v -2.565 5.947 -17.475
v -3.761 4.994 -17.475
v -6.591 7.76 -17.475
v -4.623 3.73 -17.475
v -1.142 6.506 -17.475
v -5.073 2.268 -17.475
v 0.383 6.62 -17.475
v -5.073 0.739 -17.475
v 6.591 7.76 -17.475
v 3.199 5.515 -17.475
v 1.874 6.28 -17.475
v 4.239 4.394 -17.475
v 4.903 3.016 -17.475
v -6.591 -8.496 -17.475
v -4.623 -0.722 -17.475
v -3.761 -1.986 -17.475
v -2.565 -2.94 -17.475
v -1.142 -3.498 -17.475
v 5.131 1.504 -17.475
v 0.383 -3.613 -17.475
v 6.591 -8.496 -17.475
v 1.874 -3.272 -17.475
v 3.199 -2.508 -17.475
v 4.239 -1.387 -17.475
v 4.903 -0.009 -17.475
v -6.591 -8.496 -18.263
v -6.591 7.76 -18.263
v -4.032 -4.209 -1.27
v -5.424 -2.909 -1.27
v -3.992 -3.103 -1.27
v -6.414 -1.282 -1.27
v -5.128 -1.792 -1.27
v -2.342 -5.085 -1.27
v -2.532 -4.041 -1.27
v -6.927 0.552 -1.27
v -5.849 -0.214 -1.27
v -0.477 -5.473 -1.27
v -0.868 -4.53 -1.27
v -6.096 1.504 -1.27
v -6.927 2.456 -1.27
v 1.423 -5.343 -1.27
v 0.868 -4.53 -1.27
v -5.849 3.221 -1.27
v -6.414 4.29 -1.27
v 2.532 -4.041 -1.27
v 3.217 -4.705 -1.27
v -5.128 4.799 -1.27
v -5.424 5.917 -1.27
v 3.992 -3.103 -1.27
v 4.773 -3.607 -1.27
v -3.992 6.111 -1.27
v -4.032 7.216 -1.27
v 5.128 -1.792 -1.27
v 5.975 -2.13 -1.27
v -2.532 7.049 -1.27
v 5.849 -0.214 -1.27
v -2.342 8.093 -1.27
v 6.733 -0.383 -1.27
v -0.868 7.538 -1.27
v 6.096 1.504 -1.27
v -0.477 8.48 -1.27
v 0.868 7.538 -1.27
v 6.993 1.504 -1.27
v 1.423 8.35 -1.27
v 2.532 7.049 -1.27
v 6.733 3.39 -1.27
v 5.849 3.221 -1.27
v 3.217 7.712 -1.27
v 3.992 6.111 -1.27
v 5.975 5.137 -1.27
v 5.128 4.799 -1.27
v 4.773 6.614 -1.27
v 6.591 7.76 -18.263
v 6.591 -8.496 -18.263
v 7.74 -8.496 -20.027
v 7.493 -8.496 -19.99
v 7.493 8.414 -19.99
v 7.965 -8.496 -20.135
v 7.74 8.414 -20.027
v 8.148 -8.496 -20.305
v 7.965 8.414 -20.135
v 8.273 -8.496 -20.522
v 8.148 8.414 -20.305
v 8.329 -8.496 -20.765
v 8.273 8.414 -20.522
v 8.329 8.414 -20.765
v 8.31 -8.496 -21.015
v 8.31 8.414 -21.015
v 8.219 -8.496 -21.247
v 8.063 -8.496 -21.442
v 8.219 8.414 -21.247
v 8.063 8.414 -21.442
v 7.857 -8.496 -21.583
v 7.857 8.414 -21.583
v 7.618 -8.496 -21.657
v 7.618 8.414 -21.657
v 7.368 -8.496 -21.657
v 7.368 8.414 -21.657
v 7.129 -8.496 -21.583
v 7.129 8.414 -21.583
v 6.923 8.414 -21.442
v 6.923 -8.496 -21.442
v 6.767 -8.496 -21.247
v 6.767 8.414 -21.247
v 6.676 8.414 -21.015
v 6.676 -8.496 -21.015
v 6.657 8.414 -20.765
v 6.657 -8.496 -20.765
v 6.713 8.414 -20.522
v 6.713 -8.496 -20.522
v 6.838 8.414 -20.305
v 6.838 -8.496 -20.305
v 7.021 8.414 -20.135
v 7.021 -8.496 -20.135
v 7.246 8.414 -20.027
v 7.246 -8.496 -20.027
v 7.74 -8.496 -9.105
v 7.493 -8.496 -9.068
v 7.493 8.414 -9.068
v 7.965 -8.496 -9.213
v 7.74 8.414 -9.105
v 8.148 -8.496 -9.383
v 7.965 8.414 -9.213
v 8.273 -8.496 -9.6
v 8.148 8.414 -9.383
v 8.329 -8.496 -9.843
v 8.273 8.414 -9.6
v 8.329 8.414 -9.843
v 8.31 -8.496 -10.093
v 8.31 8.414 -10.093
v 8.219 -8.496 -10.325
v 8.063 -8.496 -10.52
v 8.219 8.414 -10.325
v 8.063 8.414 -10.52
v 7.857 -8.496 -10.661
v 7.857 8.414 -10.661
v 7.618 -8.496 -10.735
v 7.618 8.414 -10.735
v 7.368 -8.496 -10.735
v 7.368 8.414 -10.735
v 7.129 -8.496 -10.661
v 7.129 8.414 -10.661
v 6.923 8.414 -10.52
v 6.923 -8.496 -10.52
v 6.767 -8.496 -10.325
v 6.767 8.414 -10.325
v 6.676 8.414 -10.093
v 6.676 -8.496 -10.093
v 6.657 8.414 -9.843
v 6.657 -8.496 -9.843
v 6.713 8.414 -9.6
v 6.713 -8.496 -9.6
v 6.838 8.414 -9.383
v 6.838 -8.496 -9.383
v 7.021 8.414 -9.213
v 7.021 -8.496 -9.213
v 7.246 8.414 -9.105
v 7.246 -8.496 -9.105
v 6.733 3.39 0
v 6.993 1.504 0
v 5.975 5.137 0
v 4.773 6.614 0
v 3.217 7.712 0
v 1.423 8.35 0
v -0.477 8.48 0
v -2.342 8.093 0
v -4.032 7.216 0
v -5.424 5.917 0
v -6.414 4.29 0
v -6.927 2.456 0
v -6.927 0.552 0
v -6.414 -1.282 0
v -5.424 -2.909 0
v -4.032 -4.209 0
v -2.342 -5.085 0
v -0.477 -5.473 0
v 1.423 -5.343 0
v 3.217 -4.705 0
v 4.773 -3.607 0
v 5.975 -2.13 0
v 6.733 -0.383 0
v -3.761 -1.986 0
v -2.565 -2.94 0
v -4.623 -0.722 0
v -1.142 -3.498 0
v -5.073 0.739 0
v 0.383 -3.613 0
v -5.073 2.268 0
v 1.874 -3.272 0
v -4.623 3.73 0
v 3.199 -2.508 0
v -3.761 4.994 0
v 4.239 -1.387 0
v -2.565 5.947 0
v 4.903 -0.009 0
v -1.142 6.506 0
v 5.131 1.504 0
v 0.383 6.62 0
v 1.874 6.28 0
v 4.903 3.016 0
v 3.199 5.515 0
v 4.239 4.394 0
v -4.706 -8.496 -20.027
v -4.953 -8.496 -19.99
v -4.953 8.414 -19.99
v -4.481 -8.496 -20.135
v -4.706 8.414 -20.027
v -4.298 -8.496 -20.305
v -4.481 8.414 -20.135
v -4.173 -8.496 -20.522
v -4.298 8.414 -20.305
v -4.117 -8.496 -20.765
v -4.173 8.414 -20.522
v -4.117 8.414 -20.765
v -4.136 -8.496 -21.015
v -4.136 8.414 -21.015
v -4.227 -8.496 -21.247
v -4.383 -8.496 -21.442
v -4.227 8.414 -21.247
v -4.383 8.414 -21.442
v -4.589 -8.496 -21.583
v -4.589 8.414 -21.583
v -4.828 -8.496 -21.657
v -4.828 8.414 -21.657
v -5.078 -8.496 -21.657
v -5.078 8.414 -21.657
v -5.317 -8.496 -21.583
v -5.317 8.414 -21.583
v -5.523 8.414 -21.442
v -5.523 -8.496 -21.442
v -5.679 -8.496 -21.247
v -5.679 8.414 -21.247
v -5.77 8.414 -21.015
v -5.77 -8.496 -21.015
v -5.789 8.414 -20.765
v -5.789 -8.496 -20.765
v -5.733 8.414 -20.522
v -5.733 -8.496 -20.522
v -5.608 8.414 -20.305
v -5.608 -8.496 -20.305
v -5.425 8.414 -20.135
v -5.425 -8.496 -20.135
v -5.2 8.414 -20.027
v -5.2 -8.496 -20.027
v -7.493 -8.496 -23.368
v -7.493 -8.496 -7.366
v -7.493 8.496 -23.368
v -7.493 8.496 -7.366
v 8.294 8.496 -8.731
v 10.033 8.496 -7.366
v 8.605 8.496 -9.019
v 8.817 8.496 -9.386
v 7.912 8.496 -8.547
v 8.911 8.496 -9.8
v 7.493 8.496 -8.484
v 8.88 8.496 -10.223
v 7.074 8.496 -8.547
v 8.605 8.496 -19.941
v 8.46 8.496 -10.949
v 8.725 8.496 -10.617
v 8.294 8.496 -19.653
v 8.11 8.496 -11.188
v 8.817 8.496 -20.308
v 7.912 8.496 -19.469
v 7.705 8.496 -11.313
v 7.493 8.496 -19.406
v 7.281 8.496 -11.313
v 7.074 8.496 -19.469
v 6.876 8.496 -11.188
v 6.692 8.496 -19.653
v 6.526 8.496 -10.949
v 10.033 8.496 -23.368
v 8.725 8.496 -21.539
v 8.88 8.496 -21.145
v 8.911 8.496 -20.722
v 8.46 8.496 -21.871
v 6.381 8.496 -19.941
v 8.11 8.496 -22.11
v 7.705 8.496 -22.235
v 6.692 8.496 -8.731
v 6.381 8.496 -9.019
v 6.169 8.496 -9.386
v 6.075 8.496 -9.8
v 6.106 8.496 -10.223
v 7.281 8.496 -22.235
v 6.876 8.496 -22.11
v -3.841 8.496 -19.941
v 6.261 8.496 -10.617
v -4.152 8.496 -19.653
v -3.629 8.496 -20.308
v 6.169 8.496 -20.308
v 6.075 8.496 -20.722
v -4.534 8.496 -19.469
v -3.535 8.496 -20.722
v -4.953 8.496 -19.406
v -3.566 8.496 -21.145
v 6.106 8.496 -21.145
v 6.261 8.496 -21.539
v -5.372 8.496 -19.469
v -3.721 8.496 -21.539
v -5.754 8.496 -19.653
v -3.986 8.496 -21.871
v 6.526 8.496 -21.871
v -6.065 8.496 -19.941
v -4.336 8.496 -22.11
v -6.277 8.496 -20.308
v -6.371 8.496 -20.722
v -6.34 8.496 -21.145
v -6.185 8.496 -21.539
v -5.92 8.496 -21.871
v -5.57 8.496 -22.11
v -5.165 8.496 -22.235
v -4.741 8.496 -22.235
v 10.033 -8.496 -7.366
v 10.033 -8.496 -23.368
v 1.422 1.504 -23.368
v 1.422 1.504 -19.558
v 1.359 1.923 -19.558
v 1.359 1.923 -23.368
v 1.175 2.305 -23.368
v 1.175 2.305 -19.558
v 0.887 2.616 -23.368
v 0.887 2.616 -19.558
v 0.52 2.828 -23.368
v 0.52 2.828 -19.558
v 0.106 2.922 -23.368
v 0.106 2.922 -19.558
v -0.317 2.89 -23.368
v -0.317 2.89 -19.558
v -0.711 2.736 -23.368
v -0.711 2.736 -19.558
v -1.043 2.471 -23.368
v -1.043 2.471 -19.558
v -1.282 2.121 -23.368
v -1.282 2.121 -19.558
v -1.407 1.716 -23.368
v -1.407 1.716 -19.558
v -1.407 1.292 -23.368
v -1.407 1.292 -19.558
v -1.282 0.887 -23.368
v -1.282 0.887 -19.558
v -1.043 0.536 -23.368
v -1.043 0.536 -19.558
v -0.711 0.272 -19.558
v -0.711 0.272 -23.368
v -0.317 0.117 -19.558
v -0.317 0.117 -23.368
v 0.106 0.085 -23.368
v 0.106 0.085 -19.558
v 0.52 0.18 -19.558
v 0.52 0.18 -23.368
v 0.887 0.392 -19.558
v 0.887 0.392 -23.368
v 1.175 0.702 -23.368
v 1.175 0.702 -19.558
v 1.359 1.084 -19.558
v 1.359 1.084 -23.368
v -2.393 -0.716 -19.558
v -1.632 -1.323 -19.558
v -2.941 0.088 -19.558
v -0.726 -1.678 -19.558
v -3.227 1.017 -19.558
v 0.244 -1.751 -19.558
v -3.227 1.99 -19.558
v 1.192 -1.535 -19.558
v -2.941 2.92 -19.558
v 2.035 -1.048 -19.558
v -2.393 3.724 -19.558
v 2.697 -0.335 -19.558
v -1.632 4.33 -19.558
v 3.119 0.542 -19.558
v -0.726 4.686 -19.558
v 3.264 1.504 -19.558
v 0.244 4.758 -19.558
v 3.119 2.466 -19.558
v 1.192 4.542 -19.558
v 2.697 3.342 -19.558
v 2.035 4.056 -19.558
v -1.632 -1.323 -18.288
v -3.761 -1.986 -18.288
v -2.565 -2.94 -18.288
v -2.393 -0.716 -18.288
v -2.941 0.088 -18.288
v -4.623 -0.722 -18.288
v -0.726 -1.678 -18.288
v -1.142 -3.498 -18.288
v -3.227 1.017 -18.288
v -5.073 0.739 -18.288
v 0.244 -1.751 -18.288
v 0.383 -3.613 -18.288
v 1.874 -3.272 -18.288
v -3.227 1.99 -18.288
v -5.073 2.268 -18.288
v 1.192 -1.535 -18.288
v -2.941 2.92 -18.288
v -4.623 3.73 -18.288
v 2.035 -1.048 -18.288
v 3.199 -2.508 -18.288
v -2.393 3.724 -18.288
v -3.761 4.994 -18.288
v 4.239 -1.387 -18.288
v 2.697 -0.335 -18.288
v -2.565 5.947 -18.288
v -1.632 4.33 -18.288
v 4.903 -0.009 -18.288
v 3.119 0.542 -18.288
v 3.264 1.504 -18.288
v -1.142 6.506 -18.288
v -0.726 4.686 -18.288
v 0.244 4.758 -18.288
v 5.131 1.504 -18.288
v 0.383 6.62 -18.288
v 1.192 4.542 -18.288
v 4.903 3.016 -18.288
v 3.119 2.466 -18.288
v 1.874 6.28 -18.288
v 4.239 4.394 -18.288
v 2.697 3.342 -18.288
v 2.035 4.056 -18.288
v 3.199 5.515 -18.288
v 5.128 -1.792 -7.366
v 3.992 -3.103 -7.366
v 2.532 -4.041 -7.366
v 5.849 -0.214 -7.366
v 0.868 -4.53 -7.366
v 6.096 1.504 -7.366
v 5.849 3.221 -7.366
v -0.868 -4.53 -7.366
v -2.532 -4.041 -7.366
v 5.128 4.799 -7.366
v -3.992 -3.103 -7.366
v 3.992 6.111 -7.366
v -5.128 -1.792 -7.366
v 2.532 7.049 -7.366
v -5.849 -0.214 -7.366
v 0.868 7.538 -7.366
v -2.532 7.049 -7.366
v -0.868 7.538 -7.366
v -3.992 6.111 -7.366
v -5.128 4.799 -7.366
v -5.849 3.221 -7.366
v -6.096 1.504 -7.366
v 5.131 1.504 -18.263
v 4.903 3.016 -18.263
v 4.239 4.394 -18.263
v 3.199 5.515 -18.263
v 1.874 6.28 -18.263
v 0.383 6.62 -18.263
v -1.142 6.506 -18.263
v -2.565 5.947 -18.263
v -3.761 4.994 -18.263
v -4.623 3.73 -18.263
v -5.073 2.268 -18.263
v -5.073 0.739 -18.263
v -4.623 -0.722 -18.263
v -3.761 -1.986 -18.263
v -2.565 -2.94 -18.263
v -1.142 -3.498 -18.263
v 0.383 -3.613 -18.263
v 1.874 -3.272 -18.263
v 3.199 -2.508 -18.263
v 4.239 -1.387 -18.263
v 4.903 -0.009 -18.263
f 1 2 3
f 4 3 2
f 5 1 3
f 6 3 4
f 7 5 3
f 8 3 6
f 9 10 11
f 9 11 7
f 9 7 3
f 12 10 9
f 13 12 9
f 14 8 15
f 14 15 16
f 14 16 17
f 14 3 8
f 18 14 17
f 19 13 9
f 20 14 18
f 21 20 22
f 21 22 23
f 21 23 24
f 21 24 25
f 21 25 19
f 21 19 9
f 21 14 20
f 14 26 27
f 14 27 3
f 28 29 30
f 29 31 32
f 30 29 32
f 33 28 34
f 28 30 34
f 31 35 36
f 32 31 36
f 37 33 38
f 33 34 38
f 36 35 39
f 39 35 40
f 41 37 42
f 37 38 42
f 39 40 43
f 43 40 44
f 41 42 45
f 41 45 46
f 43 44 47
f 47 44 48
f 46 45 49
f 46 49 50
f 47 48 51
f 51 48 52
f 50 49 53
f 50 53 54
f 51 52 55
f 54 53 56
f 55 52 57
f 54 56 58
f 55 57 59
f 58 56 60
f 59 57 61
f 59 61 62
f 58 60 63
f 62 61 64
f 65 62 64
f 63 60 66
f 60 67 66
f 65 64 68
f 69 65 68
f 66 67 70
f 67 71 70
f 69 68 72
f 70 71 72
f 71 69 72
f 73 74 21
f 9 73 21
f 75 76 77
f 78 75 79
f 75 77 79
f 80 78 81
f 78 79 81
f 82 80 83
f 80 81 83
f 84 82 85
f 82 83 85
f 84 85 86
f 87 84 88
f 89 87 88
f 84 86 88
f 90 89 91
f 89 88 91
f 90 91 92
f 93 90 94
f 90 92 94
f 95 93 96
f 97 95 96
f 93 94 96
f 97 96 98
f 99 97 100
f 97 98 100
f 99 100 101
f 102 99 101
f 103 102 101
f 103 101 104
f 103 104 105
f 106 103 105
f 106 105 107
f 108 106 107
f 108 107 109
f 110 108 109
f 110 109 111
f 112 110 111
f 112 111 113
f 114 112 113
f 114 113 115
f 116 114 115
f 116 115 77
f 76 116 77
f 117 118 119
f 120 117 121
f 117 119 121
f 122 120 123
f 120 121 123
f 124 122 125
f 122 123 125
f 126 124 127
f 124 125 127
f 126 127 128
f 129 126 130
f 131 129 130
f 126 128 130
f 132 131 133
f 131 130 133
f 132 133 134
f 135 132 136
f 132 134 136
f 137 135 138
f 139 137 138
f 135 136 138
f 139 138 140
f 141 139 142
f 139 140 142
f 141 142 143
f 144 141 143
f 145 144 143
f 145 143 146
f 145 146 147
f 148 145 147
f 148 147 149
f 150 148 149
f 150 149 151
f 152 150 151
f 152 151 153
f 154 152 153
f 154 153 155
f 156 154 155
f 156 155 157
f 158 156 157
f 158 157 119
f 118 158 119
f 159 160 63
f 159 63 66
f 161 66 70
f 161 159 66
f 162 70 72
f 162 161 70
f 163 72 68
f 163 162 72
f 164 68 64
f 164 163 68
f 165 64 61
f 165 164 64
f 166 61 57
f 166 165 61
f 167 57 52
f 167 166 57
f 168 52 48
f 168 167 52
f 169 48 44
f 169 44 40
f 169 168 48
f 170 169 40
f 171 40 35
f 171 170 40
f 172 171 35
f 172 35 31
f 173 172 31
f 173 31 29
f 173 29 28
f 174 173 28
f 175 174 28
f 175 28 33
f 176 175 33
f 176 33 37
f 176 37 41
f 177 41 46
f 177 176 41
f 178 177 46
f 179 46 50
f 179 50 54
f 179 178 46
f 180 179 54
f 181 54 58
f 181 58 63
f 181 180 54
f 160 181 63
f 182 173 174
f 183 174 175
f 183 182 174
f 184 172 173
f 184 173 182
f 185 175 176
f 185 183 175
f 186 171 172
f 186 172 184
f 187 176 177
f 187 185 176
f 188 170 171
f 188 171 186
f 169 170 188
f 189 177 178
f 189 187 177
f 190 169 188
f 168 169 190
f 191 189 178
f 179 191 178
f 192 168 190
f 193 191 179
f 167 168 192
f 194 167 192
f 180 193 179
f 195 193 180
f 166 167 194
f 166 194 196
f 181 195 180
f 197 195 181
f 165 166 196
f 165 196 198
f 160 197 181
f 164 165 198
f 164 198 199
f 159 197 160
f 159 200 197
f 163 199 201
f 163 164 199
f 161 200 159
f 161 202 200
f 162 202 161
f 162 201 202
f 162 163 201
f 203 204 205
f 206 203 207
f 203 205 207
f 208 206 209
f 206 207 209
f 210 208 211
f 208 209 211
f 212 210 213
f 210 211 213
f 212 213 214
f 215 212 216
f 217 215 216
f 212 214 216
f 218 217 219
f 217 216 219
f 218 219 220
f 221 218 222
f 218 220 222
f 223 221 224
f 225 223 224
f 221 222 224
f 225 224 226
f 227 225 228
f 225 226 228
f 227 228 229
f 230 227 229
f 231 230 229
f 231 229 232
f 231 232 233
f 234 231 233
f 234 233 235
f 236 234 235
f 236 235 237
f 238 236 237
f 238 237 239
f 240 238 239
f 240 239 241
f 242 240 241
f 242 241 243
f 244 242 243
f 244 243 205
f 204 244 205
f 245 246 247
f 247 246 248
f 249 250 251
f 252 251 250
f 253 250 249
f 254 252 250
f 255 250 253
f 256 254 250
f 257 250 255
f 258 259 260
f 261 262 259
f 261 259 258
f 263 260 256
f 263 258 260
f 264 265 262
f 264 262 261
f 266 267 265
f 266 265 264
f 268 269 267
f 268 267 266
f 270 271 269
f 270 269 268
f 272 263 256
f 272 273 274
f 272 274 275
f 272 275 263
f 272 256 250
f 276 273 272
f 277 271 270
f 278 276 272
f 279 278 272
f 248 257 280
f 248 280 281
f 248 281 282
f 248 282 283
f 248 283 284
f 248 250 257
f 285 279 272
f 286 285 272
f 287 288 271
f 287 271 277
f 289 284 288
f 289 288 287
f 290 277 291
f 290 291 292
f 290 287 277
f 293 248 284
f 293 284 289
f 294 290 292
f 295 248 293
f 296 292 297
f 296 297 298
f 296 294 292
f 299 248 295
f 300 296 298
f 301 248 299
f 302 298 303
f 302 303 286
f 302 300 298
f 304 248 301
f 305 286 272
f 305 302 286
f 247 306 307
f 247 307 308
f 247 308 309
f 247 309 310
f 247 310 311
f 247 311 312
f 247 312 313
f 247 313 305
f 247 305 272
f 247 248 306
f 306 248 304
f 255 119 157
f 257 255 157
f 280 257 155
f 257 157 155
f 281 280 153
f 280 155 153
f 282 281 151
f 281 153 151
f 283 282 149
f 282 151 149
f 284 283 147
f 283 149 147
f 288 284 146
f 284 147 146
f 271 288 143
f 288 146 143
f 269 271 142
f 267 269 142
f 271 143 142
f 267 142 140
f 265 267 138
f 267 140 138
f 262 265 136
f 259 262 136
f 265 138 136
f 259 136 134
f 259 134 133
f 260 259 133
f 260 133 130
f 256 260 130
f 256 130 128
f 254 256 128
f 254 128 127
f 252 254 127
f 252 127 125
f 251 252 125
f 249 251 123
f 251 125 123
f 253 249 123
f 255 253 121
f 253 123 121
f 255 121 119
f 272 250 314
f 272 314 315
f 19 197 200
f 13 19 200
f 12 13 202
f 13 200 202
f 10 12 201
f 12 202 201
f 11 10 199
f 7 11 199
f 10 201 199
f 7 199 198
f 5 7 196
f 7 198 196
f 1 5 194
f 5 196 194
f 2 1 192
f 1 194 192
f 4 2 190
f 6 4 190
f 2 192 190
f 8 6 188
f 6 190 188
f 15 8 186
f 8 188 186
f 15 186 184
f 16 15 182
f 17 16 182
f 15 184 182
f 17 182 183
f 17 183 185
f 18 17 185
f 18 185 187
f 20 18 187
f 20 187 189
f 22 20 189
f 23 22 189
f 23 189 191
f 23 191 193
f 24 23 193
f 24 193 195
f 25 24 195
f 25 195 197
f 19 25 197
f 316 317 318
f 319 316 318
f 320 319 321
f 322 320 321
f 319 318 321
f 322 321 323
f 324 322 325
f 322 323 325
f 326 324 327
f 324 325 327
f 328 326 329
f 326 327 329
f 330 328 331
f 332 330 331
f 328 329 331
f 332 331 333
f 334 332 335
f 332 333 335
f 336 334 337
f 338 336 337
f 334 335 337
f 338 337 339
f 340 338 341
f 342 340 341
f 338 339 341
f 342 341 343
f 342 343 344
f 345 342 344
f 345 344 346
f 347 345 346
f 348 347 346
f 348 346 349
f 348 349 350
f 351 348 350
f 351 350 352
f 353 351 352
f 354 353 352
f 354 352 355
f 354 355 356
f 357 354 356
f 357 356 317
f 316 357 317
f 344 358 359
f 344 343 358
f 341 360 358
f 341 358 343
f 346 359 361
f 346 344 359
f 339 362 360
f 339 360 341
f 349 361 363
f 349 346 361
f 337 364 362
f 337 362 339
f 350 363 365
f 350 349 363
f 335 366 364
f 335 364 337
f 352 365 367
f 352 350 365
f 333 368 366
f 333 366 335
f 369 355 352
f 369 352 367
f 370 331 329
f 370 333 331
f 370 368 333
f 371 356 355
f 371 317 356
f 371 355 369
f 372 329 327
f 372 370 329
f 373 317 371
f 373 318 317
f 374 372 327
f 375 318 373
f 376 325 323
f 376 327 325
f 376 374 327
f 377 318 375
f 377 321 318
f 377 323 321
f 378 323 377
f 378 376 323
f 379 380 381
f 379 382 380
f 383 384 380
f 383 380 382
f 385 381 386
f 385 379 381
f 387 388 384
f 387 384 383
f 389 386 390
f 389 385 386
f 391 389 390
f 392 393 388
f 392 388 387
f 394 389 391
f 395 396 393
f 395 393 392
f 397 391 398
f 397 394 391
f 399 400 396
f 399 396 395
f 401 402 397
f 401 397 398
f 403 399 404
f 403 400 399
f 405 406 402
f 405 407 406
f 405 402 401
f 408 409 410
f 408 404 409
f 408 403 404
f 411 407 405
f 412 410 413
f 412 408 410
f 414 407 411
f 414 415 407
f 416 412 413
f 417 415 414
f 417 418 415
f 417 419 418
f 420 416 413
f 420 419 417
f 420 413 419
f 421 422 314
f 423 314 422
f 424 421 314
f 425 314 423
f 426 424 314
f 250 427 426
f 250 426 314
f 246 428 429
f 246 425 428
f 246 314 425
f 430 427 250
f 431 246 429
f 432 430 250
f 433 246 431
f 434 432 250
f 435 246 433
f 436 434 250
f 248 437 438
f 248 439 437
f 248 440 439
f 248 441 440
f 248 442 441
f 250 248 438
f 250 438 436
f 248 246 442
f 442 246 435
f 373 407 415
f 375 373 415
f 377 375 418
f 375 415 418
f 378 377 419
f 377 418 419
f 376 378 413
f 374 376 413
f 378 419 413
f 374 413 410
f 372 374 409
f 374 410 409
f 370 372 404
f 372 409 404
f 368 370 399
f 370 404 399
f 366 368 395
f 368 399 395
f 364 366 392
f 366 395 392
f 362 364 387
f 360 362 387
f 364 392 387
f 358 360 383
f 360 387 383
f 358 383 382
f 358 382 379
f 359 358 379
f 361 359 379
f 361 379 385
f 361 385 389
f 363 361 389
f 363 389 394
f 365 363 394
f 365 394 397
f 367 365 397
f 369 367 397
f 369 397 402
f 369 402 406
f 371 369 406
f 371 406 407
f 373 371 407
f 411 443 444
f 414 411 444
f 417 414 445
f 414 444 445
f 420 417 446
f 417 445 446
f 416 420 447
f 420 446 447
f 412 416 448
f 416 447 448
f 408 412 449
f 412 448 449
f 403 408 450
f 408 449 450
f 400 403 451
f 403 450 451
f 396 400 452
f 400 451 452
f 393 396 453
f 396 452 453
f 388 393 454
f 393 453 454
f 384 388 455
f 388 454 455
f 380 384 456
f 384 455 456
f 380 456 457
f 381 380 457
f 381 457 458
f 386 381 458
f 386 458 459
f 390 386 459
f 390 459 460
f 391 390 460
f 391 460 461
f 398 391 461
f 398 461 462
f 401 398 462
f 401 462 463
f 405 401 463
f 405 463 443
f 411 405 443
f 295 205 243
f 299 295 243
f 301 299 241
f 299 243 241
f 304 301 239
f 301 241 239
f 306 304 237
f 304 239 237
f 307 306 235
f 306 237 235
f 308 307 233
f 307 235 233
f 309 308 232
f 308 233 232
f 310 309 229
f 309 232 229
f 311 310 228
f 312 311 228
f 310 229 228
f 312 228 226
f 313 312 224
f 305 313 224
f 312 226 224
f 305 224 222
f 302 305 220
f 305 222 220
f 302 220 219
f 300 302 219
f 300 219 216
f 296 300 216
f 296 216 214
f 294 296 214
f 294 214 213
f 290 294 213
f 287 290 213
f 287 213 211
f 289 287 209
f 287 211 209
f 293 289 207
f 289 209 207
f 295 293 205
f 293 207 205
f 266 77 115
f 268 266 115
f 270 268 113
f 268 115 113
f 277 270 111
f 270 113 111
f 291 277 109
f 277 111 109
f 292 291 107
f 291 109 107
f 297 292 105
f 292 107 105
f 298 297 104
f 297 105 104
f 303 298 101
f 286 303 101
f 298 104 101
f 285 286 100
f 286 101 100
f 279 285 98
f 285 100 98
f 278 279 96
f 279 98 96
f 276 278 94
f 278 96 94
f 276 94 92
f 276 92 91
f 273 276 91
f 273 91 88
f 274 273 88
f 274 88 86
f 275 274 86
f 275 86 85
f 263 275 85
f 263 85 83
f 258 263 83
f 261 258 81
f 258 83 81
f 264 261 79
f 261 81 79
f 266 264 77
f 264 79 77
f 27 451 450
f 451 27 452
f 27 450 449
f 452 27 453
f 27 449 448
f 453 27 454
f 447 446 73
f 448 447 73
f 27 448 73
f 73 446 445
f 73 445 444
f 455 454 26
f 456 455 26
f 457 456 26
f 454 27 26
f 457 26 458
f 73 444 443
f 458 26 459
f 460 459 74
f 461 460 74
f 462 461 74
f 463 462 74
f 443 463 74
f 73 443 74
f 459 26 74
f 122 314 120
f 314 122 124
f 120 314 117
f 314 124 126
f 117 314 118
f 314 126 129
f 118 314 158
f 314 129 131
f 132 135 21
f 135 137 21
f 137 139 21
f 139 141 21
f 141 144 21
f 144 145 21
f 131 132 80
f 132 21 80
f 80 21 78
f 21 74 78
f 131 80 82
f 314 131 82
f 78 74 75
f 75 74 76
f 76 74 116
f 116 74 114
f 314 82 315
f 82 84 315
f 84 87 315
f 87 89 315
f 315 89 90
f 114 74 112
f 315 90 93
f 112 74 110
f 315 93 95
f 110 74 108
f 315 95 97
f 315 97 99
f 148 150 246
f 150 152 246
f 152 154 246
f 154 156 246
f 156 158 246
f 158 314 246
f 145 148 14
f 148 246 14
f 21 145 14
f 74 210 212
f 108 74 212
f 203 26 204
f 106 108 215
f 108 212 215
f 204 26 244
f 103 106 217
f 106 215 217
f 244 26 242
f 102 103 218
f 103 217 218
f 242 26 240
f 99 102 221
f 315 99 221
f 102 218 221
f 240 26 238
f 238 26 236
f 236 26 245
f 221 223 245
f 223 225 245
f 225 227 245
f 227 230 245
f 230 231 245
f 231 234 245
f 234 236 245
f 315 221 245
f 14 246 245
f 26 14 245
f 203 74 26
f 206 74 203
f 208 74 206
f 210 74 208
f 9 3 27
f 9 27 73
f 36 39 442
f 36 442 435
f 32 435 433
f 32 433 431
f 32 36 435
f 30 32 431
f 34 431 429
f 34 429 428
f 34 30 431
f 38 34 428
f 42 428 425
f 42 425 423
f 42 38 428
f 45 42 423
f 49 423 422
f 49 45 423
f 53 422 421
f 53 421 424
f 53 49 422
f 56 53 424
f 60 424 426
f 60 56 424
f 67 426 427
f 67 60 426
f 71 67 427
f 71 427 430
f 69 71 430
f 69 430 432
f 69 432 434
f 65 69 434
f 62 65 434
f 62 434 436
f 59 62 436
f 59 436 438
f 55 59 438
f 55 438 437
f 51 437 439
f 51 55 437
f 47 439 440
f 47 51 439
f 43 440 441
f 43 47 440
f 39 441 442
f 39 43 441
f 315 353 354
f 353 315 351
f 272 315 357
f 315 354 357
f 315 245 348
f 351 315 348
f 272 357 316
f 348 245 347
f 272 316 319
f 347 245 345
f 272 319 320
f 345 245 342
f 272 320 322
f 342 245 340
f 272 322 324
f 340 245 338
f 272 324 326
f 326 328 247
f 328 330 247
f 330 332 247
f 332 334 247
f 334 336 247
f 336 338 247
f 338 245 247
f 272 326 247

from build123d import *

# Parameters (mm, degrees)
SKETCH1_W           = 14.986
SKETCH1_H           = 16.9926
BOSS_EXTRUDE4_DEPTH = 24.1554
SKETCH10_R          = 1.4224
CUT_EXTRUDE6_DEPTH  = 24.1554
SKETCH11_R          = 3.2639
CUT_EXTRUDE7_DEPTH  = 19.558
SKETCH12_R          = 5.1308
CUT_EXTRUDE8_DEPTH  = 18.288
SKETCH13_W          = 14.986
SKETCH13_H          = 16.9926
SKETCH13_R          = 5.1308
CUT_EXTRUDE9_DEPTH  = 7.366
BOSS_EXTRUDE5_START = 6.096
SKETCH14_R          = 6.096
SKETCH14_R_2        = 5.1308
BOSS_EXTRUDE5_DEPTH = 6.096
BOSS_EXTRUDE6_START = 1.27
SKETCH15_R          = 6.9926
SKETCH15_R_2        = 5.1308
BOSS_EXTRUDE6_DEPTH = 1.27
SKETCH16_W          = 14.986
SKETCH16_H          = 16.9926
CUT_EXTRUDE10_DEPTH = 0.7874
SKETCH18_W          = 16.002
SKETCH18_H          = 16.9926
BOSS_EXTRUDE7_DEPTH = 2.54
SKETCH19_R          = 0.8382
CUT_EXTRUDE11_DEPTH = 20.32
SKETCH24_W          = 13.1826
SKETCH24_H          = 0.7874
CUT_EXTRUDE14_DEPTH = 16.256


with BuildPart() as part:
    # Sketch1 → Boss-Extrude4 (new body)
    with BuildSketch(Plane.XY):
        Rectangle(SKETCH1_W, SKETCH1_H)
    extrude(amount=-BOSS_EXTRUDE4_DEPTH)

    # Sketch10 → Cut-Extrude6 (cut)
    with BuildSketch(Plane.XY):
        with Locations((0, 1.5037)):
            Circle(SKETCH10_R)
    extrude(amount=-CUT_EXTRUDE6_DEPTH, mode=Mode.SUBTRACT)

    # Sketch11 → Cut-Extrude7 (cut)
    with BuildSketch(Plane.XY):
        with Locations((0, 1.5037)):
            Circle(SKETCH11_R)
    extrude(amount=-CUT_EXTRUDE7_DEPTH, mode=Mode.SUBTRACT)

    # Sketch12 → Cut-Extrude8 (cut)
    with BuildSketch(Plane.XY):
        with Locations((0, 1.5037)):
            Circle(SKETCH12_R)
    extrude(amount=-CUT_EXTRUDE8_DEPTH, mode=Mode.SUBTRACT)

    # Sketch13 → Cut-Extrude9 (cut)
    with BuildSketch(Plane.XY):
        Rectangle(SKETCH13_W, SKETCH13_H)
        with Locations((0, 1.5037)):
            Circle(SKETCH13_R, mode=Mode.SUBTRACT)
    extrude(amount=-CUT_EXTRUDE9_DEPTH, mode=Mode.SUBTRACT)

    # Sketch14 → Boss-Extrude5 (add)
    with BuildSketch(Plane.XY.offset(-7.366).offset(BOSS_EXTRUDE5_START)):
        with Locations(Location((0, 1.5037, 0), (0, 0, 180))):
            Circle(SKETCH14_R)
        with Locations((0, 1.5037)):
            Circle(SKETCH14_R_2, mode=Mode.SUBTRACT)
    extrude(amount=-BOSS_EXTRUDE5_DEPTH)

    # Sketch15 → Boss-Extrude6 (add)
    with BuildSketch(Plane.XY.offset(-1.27).offset(BOSS_EXTRUDE6_START)):
        with Locations((0, 1.5037)):
            Circle(SKETCH15_R)
        with Locations((0, 1.5037)):
            Circle(SKETCH15_R_2, mode=Mode.SUBTRACT)
    extrude(amount=-BOSS_EXTRUDE6_DEPTH)

    # Sketch16 → Cut-Extrude10 (cut)
    with BuildSketch(Plane(origin=(0, 0, -24.1554), x_dir=(-1, 0, 0), z_dir=(0, 0, -1))):
        Rectangle(SKETCH16_W, SKETCH16_H)
    extrude(amount=-CUT_EXTRUDE10_DEPTH, mode=Mode.SUBTRACT)

    # Sketch18 → Boss-Extrude7 (add)
    with BuildSketch(Plane(origin=(7.493, 0, 0), x_dir=(0, 0, -1), z_dir=(1, 0, 0))):
        with Locations((15.367, 0)):
            Rectangle(SKETCH18_W, SKETCH18_H)
    extrude(amount=BOSS_EXTRUDE7_DEPTH)

    # Sketch19 → Cut-Extrude11 (cut)
    with BuildSketch(Plane(origin=(0, 8.4963, 0), x_dir=(1, 0, 0), z_dir=(0, 1, 0))):
        with Locations(Location((-4.953, 20.828, 0), (0, 0, 270))):
            Circle(SKETCH19_R)
        with Locations(Location((7.493, 20.828, 0), (0, 0, 270))):
            Circle(SKETCH19_R)
        with Locations(Location((7.493, 9.906, 0), (0, 0, 270))):
            Circle(SKETCH19_R)
    extrude(amount=-CUT_EXTRUDE11_DEPTH, mode=Mode.SUBTRACT)

    # Cut-Extrude13 cone 1 section (through the dimple's axis) → Cut-Extrude13 (revolve, cut)
    with BuildSketch(Plane(origin=(-4.953, 8.4963, -20.828), x_dir=(0, 0, 1), z_dir=(1, 0, 0))):
        Polygon((0, 0), (1.4224, 0), (0, 0.199905283), align=None)
    revolve(axis=Axis((-4.953, 8.4963, -20.828), (0, -1, 0)), mode=Mode.SUBTRACT)

    # Cut-Extrude13 cone 2 section (through the dimple's axis) → Cut-Extrude13 cone 2 (revolve, cut)
    with BuildSketch(Plane(origin=(7.493, 8.4963, -20.828), x_dir=(0, 0, 1), z_dir=(1, 0, 0))):
        Polygon((0, 0), (1.4224, 0), (0, 0.199905283), align=None)
    revolve(axis=Axis((7.493, 8.4963, -20.828), (0, -1, 0)), mode=Mode.SUBTRACT)

    # Cut-Extrude13 cone 3 section (through the dimple's axis) → Cut-Extrude13 cone 3 (revolve, cut)
    with BuildSketch(Plane(origin=(7.493, 8.4963, -9.906), x_dir=(0, 0, 1), z_dir=(1, 0, 0))):
        Polygon((0, 0), (1.4224, 0), (0, 0.199905283), align=None)
    revolve(axis=Axis((7.493, 8.4963, -9.906), (0, -1, 0)), mode=Mode.SUBTRACT)

    # Sketch24 → Cut-Extrude14 (cut)
    with BuildSketch(Plane.XZ.offset(8.4963)):
        with Locations((0, -17.8689)):
            Rectangle(SKETCH24_W, SKETCH24_H)
    extrude(amount=-CUT_EXTRUDE14_DEPTH, mode=Mode.SUBTRACT)


solid = part.part
